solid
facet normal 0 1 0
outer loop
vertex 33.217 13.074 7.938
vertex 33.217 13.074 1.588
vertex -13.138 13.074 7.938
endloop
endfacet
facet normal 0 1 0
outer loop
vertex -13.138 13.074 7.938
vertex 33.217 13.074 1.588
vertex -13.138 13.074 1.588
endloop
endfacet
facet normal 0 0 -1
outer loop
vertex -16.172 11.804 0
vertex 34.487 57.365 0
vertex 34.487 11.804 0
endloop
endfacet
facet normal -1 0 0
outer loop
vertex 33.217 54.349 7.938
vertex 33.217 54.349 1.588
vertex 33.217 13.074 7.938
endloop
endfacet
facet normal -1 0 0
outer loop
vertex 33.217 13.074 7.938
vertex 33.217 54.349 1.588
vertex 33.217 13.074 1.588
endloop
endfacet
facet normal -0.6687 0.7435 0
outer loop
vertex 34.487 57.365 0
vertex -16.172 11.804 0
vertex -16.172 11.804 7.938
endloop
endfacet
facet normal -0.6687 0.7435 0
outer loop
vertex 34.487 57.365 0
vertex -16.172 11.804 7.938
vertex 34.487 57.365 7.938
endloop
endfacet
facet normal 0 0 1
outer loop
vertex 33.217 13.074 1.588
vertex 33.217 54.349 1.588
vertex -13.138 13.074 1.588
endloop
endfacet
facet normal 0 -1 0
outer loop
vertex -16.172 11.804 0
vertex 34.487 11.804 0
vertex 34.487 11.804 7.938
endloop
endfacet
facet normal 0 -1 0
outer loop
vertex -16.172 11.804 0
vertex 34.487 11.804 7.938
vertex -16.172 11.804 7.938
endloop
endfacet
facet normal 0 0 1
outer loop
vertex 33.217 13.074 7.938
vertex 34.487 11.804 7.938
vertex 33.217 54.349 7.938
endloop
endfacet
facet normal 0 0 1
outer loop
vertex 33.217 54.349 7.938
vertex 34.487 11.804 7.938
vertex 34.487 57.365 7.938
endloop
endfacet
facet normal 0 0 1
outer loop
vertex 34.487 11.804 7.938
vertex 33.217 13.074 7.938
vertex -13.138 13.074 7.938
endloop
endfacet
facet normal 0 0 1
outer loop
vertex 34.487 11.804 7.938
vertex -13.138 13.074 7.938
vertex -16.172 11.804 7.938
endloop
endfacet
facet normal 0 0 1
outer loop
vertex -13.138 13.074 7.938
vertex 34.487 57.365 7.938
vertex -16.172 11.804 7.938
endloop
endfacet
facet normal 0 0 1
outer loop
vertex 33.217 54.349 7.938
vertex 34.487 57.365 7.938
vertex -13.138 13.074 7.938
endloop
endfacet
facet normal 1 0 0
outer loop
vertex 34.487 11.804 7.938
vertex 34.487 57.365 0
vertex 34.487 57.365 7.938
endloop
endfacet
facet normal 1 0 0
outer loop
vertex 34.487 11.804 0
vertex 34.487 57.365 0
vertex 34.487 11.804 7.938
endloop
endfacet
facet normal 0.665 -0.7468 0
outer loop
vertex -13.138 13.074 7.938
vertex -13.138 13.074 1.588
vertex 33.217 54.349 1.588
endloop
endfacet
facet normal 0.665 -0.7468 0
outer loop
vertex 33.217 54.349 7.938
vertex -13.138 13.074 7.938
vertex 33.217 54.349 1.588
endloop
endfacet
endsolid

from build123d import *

# Parameters (mm, degrees)
BOSS_EXTRUDE2_DEPTH = 1.5875
BOSS_EXTRUDE3_DEPTH = 7.9375


with BuildPart() as part:
    # Sketch1 → Boss-Extrude2 (new body)
    with BuildSketch(Plane.XY):
        Polygon((33.217447351, 54.34868871), (33.217447351, 13.07368871), (-13.137552649, 13.07368871), align=None)
    extrude(amount=BOSS_EXTRUDE2_DEPTH)

    # Sketch1<5> → Boss-Extrude3 (add)
    with BuildSketch(Plane.XY):
        Polygon((34.487447351, 57.364746686), (34.487447351, 11.80368871), (-16.171808963, 11.80368871), align=None)
        Polygon((33.217447351, 54.34868871), (33.217447351, 13.07368871), (-13.137552649, 13.07368871), align=None, mode=Mode.SUBTRACT)
    extrude(amount=BOSS_EXTRUDE3_DEPTH)


solid = part.part
